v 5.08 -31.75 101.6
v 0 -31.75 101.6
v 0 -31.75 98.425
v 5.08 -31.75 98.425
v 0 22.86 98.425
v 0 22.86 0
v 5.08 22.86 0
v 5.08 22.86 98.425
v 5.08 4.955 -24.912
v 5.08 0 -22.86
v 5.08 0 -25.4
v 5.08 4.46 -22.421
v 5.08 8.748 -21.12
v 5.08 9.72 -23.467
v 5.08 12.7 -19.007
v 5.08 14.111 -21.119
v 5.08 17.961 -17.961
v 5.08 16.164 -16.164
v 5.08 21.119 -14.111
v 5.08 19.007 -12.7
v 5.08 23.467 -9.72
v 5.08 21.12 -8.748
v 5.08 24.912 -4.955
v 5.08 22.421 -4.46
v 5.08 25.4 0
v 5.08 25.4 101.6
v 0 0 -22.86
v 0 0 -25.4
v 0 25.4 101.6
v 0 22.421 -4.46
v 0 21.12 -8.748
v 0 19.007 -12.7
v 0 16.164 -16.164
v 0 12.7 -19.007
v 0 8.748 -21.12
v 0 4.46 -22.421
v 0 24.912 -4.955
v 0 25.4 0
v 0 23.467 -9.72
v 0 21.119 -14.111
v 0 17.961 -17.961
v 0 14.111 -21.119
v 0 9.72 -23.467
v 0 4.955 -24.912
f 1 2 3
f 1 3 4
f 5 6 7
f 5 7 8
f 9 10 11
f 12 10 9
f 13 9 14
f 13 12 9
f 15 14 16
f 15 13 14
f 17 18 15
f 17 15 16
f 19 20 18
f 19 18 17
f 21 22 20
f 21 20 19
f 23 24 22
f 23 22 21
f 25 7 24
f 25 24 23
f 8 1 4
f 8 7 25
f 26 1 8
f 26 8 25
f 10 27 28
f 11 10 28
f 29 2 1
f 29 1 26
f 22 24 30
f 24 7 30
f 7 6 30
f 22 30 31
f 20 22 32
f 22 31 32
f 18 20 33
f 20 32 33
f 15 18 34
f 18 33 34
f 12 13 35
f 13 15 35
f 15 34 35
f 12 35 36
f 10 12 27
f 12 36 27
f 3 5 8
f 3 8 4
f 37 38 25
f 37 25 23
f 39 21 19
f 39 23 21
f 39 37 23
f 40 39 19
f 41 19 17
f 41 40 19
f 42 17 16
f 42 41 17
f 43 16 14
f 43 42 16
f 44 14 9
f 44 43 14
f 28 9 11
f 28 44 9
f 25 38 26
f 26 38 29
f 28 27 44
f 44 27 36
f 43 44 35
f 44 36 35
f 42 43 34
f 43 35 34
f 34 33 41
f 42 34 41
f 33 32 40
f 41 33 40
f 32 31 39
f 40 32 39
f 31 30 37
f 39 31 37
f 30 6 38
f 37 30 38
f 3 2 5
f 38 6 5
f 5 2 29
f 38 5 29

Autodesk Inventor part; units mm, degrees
ref_plane "YZ Plane" through (0, 0, 0) normal (1, 0, 0) x (0, 1, 0)
ref_plane "XZ Plane" through (0, 0, 0) normal (0, 1, 0) x (-1, 0, 0)
ref_plane "XY Plane" through (0, 0, 0) normal (0, 0, 1) x (1, 0, 0)
sketch "Sketch1" plane through (0, 0, 0) normal (1, 0, 0) x (0, 1, 0)
  line L0 (0, 10.0605) -> (0, 10.7499)
  arc A0 (0, -25.4) -> (25.4, 0) centre (0, 0) ccw
  arc A1 (0, -23.8125) -> (23.8125, 0) centre (0, 0) ccw
  line L1 (25.4, 0) -> (25.4, 101.6)
  line L2 (23.8125, 0) -> (23.8125, 101.6)
  line L3 (25.4, 101.6) -> (23.8125, 101.6)
  dimension "d2" = 25.4
  dimension "d3" = 101.6
  dimension "d4" = 101.6
extrude "Extrusion1" [suppressed]
sketch "Sketch2" plane through (0, 0, 0) normal (1, 0, 0) x (0, 1, 0)
  arc A0 (0, -25.4) -> (25.4, 0) centre (0, 0) ccw
  arc A1 (0, -22.86) -> (22.86, 0) centre (0, 0) ccw
  line L0 (0, -22.86) -> (0, -25.4)
  line L1 (25.4, 0) -> (25.4, 101.6)
  line L2 (22.86, 0) -> (22.86, 98.425)
  line L3 (22.86, 98.425) -> (-6.35, 98.425)
  line L4 (-6.35, 98.425) -> (-6.35, 101.6)
  line L5 (-6.35, 101.6) -> (14.2875, 101.6)
  line L6 (14.2875, 101.6) -> (16.1645, 101.6)
  line L7 (16.1645, 101.6) -> (25.4, 101.6)
  dimension "d5" = 25.4
  dimension "d6" = 22.86
  dimension "d8" = 101.6
extrude "Extrusion2" add sketch "Sketch2" along normal blind 5.08
sketch "Sketch3" plane through (0, -6.35, 98.425) normal (0, -1, 0) x (1, 0, 0)
  line L0 (5.08, -98.425) -> (5.08, 3.175) projected
  line L1 (0, 0) -> (5.08, 0) projected
  line L2 (5.08, 3.175) -> (0, 3.175)
  line L3 (0, 3.175) -> (0, 0)
  line L4 (0, 0) -> (5.08, 0)
  line L5 (5.08, 0) -> (5.08, 3.175)
  point P0 (0, -98.425)
extrude "Extrusion3" add sketch "Sketch3" along normal blind 25.4
properties part number "CONTAINER PIPE"
